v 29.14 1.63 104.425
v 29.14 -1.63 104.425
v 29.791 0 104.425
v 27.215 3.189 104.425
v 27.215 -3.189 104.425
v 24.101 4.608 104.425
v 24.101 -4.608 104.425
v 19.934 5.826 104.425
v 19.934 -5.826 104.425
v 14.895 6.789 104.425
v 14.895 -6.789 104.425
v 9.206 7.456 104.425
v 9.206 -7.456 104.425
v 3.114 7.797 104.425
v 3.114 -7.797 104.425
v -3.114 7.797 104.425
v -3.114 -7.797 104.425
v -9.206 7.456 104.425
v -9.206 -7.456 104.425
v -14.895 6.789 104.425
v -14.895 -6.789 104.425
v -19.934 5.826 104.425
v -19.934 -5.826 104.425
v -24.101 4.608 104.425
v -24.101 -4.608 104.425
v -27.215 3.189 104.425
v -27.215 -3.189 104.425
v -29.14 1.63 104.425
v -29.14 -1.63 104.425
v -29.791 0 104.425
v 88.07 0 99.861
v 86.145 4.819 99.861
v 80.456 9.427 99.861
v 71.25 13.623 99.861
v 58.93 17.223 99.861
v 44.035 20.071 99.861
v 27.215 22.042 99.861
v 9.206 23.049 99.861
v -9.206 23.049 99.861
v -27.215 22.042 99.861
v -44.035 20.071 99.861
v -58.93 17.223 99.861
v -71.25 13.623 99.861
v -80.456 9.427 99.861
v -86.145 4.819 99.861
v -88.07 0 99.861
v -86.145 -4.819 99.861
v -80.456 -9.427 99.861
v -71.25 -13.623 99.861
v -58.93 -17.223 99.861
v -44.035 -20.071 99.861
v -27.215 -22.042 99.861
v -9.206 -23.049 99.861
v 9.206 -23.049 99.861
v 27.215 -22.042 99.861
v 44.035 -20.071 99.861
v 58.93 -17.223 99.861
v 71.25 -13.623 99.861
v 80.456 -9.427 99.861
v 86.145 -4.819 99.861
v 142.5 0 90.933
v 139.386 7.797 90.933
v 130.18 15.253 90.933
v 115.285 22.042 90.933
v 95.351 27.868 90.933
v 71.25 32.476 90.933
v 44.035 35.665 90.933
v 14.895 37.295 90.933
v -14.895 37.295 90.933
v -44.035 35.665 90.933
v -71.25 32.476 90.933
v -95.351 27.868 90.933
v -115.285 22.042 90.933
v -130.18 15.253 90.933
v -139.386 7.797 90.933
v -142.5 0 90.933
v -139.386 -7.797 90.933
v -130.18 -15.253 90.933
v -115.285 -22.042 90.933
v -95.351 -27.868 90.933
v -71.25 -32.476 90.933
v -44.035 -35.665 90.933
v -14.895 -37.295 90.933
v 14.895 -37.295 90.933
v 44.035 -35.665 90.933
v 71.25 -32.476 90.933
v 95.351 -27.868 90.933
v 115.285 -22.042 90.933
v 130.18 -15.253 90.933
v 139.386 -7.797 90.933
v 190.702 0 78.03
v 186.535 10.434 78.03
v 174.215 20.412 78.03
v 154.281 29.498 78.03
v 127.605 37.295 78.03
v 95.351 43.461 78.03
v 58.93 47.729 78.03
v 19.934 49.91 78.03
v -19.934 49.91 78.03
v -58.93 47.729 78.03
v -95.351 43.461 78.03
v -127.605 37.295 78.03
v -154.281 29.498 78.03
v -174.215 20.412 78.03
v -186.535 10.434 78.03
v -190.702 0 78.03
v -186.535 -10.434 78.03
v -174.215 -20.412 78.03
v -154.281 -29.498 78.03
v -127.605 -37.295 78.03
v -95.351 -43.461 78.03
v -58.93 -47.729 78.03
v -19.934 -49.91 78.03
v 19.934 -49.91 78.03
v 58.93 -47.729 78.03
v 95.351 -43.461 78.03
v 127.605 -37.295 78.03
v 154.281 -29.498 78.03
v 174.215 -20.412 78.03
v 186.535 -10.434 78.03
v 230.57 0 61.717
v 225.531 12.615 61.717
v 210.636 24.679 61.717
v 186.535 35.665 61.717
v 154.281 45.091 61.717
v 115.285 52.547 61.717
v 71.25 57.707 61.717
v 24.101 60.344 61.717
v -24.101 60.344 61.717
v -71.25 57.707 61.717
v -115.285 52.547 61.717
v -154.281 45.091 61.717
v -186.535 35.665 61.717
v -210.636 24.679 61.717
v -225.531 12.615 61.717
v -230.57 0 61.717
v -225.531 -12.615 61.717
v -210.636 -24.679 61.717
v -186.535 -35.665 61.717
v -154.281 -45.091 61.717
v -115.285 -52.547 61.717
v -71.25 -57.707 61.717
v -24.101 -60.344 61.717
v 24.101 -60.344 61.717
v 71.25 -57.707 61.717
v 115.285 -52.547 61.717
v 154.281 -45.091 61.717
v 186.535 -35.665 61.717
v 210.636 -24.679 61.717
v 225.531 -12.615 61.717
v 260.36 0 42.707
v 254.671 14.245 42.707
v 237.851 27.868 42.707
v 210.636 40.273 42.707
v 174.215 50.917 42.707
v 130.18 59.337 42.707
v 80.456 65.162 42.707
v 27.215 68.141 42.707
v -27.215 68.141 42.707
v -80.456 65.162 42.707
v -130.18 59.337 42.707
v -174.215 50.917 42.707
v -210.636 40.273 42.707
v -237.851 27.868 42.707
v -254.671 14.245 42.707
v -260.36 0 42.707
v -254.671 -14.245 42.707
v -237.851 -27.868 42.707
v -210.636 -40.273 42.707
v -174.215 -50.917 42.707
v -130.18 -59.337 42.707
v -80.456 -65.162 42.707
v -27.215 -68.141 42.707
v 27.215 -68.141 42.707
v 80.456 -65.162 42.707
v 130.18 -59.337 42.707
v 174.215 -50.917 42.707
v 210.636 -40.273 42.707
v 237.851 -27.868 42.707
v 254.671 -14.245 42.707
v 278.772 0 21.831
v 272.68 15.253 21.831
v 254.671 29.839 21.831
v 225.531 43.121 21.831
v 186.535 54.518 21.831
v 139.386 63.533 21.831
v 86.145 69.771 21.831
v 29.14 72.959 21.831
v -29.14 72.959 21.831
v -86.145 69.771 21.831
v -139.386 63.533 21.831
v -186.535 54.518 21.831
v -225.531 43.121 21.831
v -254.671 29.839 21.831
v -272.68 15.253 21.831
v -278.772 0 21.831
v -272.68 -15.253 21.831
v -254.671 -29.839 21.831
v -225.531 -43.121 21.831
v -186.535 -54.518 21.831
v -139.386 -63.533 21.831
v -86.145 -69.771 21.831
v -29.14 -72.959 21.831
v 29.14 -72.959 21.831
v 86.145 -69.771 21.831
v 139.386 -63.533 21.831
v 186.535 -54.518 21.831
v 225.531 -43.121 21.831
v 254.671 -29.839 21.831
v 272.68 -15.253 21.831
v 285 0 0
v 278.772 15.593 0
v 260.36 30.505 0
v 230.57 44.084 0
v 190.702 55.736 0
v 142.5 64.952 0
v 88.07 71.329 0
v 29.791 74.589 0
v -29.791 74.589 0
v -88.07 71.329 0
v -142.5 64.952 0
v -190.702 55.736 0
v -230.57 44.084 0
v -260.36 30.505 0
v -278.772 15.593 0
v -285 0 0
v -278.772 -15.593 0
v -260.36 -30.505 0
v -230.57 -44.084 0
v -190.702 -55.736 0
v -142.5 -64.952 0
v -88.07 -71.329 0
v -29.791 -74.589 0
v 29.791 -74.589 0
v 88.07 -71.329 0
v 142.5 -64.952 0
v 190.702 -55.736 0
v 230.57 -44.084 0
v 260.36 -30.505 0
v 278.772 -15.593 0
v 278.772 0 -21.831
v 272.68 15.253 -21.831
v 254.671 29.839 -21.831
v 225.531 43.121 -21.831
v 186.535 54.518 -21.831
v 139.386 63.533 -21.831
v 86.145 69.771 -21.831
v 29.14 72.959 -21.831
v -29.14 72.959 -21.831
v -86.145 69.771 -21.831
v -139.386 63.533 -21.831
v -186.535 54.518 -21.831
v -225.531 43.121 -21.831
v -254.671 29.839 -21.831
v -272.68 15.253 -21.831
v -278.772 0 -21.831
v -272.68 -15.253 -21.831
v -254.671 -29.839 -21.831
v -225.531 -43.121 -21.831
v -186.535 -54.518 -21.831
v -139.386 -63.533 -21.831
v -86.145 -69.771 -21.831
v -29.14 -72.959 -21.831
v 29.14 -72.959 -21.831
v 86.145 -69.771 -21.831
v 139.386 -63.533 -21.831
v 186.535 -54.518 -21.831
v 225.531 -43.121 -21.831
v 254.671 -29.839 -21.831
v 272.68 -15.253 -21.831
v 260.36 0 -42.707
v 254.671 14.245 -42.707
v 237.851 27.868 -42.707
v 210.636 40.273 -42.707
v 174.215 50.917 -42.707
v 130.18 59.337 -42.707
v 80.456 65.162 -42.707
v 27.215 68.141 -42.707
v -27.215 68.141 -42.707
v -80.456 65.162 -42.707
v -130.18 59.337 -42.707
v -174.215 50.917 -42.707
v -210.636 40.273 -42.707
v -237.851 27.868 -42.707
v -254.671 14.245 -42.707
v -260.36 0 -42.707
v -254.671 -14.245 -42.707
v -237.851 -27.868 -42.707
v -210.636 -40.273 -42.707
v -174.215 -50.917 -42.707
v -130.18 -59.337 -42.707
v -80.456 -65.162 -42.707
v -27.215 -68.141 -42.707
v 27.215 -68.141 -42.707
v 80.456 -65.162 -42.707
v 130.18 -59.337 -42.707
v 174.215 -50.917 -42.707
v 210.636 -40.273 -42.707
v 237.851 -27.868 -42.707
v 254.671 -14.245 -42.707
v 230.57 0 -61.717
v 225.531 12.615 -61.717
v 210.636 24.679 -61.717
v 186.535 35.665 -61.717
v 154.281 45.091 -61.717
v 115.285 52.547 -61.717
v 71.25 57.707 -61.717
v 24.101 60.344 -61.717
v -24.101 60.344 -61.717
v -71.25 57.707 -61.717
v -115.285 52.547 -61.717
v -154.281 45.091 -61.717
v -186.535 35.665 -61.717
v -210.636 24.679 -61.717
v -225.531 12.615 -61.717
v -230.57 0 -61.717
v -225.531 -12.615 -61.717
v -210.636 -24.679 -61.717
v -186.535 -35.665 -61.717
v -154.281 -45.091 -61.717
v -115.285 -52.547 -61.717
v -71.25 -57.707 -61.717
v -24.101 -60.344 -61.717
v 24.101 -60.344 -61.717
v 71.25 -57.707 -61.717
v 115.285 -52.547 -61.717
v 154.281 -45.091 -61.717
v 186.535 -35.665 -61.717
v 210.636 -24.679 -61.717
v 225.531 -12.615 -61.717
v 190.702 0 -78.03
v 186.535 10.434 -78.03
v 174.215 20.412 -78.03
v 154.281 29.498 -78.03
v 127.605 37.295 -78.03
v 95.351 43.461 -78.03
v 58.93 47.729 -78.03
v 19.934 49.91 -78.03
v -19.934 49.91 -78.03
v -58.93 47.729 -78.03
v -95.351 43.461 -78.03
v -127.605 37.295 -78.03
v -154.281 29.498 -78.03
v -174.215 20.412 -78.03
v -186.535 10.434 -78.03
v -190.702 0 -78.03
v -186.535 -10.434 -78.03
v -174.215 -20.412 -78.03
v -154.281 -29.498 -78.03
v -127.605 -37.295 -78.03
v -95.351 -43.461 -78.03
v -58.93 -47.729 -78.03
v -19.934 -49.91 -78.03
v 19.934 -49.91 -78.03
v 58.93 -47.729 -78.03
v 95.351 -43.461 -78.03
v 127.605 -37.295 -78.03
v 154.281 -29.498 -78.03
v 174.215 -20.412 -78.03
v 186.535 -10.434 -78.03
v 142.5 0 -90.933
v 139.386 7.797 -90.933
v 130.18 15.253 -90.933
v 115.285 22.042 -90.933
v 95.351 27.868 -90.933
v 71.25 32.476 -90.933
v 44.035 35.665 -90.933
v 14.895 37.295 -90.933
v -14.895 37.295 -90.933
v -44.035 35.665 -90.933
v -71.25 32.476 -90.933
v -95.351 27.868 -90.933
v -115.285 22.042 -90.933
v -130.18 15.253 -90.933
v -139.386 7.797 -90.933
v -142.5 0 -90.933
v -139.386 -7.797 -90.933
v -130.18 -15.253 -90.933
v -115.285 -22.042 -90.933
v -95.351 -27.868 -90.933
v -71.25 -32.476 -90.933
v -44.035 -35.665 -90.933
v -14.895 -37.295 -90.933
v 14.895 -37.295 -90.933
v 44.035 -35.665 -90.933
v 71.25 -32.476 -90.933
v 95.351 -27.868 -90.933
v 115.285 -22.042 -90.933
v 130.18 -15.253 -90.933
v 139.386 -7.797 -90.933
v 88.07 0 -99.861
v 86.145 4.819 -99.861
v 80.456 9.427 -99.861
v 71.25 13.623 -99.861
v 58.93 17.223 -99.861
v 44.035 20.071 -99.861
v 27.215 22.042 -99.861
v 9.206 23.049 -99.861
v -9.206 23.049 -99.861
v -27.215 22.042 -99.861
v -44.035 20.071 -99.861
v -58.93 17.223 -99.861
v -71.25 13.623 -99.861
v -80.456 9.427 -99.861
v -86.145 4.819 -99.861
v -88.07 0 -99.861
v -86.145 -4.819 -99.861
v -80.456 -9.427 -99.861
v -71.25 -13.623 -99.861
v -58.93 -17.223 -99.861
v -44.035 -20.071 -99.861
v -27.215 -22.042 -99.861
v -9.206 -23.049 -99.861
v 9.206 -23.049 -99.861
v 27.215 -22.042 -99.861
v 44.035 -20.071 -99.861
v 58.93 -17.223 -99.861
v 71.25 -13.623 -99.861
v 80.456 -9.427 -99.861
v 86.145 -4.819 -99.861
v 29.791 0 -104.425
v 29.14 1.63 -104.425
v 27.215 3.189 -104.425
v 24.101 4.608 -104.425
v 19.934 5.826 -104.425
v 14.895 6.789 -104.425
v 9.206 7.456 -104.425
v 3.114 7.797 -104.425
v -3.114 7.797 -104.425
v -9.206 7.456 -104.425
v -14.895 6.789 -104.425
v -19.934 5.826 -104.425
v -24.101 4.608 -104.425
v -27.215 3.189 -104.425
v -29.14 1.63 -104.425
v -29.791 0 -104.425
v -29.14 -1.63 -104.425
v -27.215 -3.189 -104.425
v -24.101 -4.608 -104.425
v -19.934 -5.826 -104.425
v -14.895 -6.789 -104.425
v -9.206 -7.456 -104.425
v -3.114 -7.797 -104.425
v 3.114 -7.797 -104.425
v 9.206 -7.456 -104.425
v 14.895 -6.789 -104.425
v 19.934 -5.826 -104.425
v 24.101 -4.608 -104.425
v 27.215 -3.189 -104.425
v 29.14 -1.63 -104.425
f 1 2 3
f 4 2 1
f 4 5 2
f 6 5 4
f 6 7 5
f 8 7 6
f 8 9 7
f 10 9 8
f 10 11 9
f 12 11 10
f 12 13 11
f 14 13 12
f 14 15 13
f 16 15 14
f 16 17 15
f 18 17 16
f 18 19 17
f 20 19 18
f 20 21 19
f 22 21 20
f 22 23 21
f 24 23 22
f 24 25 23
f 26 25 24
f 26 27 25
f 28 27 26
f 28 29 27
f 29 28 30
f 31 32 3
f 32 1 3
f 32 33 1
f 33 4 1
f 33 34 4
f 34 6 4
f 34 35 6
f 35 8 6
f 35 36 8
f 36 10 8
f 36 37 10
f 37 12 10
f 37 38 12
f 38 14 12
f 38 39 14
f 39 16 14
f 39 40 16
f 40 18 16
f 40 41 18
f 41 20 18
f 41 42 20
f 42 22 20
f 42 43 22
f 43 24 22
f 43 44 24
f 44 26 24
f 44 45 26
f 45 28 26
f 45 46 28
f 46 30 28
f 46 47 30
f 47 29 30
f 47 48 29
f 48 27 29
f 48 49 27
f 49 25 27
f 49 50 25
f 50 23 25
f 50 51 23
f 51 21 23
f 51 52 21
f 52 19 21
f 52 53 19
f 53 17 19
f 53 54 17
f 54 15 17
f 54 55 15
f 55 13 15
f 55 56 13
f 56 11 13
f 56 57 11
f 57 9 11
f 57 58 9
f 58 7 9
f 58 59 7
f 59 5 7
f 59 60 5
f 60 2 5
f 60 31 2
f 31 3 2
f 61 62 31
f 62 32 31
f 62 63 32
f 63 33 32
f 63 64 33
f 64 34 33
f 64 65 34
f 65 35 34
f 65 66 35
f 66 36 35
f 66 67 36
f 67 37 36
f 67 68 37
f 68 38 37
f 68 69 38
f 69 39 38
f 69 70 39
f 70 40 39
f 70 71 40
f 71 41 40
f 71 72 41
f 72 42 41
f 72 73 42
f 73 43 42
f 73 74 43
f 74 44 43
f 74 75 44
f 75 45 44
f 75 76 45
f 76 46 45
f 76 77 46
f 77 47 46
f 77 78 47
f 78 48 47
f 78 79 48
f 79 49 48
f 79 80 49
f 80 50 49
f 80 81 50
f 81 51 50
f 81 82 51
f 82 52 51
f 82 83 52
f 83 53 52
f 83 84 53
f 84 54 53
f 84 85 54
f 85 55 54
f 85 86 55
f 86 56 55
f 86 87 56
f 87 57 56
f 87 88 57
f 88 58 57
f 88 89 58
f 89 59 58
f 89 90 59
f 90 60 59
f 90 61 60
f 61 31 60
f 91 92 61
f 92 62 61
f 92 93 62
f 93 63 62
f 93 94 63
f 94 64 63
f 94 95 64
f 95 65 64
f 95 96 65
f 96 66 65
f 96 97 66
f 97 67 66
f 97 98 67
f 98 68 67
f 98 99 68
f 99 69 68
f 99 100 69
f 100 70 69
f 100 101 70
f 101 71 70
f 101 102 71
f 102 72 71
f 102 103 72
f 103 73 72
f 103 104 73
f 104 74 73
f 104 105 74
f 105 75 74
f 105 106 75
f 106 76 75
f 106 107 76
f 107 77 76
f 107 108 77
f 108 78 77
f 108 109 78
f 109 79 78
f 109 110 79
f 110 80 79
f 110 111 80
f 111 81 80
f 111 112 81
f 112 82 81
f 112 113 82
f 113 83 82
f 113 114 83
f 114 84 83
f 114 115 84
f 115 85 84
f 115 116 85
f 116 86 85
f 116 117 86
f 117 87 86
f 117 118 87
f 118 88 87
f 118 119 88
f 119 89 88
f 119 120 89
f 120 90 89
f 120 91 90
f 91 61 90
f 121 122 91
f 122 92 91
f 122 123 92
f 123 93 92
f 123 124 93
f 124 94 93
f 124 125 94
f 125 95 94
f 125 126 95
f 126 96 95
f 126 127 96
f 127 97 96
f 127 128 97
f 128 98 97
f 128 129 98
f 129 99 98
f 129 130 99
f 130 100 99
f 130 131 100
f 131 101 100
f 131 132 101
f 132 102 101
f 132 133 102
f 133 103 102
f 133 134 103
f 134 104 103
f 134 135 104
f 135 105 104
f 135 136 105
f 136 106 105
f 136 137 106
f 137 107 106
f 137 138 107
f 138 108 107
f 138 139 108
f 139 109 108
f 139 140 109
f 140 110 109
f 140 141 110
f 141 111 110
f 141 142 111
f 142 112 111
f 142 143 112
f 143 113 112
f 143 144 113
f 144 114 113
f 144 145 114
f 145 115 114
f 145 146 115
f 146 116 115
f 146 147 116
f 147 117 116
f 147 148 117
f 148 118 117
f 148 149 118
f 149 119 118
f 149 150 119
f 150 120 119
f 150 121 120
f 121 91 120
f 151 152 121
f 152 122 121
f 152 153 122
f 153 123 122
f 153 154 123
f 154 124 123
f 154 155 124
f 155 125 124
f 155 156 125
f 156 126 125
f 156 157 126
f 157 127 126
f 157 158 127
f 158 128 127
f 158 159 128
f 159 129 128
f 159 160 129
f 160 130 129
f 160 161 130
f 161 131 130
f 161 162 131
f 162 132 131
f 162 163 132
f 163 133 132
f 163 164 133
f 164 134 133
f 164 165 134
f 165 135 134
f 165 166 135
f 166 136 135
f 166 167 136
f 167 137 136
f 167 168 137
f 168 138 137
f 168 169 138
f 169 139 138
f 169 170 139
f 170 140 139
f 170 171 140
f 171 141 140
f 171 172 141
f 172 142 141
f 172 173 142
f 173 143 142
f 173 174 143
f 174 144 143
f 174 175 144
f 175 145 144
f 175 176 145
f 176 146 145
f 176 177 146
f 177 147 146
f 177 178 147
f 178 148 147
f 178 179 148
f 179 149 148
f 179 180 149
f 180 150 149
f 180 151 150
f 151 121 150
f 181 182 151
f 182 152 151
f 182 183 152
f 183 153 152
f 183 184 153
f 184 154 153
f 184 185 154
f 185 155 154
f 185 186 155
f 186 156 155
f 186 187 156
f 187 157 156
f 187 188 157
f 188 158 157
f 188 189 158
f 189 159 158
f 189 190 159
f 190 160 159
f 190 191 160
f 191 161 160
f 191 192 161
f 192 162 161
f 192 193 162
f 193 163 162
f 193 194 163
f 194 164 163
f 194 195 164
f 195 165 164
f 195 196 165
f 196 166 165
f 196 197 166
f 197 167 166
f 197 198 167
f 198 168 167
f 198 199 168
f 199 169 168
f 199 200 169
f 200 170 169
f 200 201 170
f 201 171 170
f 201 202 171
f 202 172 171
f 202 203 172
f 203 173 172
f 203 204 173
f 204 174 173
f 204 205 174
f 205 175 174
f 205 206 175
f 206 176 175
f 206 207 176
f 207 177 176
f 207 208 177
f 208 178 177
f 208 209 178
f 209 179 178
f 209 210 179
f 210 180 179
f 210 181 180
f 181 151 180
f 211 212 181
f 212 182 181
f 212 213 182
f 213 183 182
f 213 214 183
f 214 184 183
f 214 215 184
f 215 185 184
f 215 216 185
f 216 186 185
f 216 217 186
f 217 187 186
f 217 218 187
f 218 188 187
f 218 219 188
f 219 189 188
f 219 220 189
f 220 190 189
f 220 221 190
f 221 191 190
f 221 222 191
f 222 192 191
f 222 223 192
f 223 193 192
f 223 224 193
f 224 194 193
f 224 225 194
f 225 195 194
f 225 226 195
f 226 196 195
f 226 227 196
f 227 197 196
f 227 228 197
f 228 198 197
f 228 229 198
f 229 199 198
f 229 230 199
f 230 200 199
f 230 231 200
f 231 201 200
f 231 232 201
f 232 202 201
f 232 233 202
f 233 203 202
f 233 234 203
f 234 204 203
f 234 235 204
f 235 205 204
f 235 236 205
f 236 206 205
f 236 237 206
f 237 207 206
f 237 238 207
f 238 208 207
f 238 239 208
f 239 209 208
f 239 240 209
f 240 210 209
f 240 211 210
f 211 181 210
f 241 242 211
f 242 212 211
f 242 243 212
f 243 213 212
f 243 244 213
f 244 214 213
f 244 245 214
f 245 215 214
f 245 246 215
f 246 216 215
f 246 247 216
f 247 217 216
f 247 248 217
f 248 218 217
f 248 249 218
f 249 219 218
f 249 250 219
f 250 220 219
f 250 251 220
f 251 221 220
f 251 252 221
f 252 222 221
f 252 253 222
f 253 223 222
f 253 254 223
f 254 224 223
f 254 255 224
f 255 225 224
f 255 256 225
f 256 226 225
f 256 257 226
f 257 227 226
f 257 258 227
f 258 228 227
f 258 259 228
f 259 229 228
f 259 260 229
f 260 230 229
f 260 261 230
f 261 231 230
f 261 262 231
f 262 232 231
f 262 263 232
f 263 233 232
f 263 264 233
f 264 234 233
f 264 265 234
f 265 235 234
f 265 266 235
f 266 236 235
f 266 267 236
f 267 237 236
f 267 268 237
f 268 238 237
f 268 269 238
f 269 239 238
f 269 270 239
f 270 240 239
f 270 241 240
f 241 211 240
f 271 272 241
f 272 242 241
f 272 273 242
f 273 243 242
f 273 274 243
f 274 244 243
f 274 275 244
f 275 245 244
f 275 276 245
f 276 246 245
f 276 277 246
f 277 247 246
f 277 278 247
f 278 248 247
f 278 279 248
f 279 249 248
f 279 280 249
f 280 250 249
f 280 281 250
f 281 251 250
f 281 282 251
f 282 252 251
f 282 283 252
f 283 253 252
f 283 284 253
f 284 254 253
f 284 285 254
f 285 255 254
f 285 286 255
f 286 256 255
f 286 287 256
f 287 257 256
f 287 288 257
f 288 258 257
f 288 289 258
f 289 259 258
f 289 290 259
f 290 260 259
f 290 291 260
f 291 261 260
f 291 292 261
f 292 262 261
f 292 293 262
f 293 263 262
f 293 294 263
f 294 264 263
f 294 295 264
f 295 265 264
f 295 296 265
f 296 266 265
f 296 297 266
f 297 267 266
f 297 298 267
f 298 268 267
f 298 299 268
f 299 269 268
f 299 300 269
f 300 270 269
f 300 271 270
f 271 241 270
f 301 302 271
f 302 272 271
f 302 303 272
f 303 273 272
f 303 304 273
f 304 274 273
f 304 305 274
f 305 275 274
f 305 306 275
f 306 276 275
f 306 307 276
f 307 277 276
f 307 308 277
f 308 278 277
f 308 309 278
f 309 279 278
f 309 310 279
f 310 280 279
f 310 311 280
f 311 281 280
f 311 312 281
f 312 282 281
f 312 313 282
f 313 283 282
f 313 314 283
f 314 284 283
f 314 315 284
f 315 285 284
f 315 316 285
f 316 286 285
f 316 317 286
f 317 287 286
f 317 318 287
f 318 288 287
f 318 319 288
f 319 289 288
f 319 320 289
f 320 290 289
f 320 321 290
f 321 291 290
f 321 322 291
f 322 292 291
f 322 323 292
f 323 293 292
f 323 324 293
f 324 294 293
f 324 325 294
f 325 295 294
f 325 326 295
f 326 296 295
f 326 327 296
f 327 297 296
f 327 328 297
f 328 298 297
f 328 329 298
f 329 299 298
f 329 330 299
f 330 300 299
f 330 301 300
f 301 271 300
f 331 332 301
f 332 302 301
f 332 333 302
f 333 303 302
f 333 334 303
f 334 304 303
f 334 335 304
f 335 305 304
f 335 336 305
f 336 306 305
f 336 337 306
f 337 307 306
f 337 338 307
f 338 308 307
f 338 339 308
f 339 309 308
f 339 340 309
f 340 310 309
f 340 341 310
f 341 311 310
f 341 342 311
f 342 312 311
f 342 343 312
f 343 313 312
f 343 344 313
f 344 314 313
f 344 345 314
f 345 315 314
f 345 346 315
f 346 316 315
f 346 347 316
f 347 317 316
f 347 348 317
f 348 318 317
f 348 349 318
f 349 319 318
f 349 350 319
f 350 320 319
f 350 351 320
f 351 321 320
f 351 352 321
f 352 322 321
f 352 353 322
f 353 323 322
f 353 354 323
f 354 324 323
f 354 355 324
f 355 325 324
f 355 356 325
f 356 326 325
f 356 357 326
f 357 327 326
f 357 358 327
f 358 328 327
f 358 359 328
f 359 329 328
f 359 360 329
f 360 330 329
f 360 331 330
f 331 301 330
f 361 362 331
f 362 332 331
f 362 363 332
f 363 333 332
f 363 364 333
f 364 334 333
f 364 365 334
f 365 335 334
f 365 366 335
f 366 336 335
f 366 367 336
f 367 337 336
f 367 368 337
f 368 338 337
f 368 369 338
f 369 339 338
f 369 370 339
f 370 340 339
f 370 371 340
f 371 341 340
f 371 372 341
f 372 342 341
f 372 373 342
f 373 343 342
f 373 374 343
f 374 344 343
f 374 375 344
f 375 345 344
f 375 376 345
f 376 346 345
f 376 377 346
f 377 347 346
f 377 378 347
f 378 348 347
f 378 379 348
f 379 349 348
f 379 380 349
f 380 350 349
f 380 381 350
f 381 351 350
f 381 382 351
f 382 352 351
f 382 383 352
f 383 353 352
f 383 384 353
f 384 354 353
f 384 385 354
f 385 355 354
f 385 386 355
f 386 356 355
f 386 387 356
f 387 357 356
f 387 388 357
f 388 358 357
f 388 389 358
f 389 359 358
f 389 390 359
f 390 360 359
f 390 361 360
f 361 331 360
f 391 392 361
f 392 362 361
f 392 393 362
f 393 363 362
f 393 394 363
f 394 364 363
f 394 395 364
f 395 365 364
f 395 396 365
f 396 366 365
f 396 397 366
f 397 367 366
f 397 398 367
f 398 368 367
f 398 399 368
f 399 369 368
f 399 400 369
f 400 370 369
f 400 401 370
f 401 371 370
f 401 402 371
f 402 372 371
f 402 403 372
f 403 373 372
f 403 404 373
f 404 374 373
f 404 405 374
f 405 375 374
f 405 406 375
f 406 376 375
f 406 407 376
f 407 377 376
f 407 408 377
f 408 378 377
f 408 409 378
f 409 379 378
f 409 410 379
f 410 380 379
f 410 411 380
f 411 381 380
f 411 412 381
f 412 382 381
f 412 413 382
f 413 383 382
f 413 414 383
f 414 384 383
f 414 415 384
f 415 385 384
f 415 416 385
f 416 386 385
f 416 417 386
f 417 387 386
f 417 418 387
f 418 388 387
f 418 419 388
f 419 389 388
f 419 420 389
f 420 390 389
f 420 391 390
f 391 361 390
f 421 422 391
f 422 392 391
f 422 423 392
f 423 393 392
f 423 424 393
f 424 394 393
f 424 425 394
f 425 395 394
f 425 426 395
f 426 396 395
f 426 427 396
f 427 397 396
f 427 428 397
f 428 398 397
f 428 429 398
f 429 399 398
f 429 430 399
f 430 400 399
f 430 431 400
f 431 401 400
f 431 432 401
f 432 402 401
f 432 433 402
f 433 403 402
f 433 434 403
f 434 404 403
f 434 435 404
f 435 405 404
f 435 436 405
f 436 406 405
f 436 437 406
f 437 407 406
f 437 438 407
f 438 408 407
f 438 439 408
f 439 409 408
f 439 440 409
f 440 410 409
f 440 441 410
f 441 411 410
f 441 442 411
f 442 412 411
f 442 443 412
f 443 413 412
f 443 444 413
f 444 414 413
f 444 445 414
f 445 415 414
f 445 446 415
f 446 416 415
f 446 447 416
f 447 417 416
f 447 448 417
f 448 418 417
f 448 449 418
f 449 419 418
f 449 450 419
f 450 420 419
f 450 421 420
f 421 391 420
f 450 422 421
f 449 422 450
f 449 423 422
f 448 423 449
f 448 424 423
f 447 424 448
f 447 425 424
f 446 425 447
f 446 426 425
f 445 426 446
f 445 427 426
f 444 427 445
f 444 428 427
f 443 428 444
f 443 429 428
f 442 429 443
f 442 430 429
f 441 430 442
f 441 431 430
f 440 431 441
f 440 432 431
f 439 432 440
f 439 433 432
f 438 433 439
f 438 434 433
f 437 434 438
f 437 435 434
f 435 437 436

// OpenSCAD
// Generated by SolidPython 1.0.1 on 2020-07-29 00:46:53


scale(v = [19, 5, 7]) {
	sphere(r = 15);
}
/***********************************************
*********      SolidPython code:      **********
************************************************
 
# import packages: SolidPython
from solid import *
from solid.utils import *
from itertools import chain, combinations, permutations


class Resize:

    def __init__(self, scad_file):
        self.scad_file = scad_file
        #self.scad_file = import_scad(scad_file)
        # cone/cylinder param:
        self.r1 = 0
        self.r2 = 0
        self.h = 0
        # rectangular prism param:
        self.w = 0
        self.l = 0
        # ellipse param:
        self.r = 0

    # import OpenScad code (file name corresponds to shape)


    # classify shape + parameters
    def assign(self, param1, param2, param3):
        if self.scad_file == 'cone.scad':
            self.r1 = param1
            self.r2 = param2
            self.h = param3
        elif self.scad_file == 'cylinder.scad':
            self.r1 = param1
            self.r2 = param2
            self.h = param3
        elif self.scad_file == 'rectangularPrism.scad':
            self.h = param1
            self.l = param2
            self.w = param3
        else:
            self.r = param1
            self.h = param2

    # resize parameters
    def iterate(self):
        x = range(3, 20, 2)
        i = 1
        if self.scad_file == 'cone.scad':
            tempList = list(permutations(x, 2))
            for temp in tempList:
                param1 = temp[0]
                param2 = temp[1]
                filepath = 'produced_scad_files/' + 'cone' + str(param1) + '_' + str(param2) + '_' + '.scad'
                scad_render_to_file(cylinder(h=param1, r1=param2, r2=0), filepath)

        elif self.scad_file == 'cylinder.scad':
            tempList = list(permutations(x, 3))
            for temp in tempList:
                param1 = temp[0]
                param2 = temp[1]
                filepath = 'produced_scad_files/' + 'cylinder' + str(param1) + '_' + str(param2) + '_' + '.scad'
                scad_render_to_file(cylinder(h=param1, r1=param2, r2=param2), filepath)

        elif self.scad_file == 'rectangularPrism.scad':
            tempList = list(permutations(x, 3))
            for temp in tempList:
                param1 = temp[0]
                param2 = temp[1]
                param3 = temp[2]
                filepath = 'produced_scad_files/' + 'rectangularPrism' + str(param1) + '_' + str(param2) + '_' + str(
                    param3) + '.scad'
                scad_render_to_file(cube(size=(param1, param2, param3)), filepath)

        elif self.scad_file == 'ellipse.scad':
            tempList = list(permutations(x, 4))
            for temp in tempList:
                param1 = temp[0]
                param2 = temp[1]
                param3 = temp[2]
                param4 = temp[3]
                filepath = 'produced_scad_files/' + 'ellipse' + str(param1) + '_' + str(param2) + '_' + str(param3) + '_' + str(param4) + '.scad'
                scad_render_to_file(scale([param1, param2, param3])(sphere(r=param4)), filepath)

    def render_to_scadfile(self):
        scad_render_to_file(scad, 'example.scad') 
 
************************************************/
